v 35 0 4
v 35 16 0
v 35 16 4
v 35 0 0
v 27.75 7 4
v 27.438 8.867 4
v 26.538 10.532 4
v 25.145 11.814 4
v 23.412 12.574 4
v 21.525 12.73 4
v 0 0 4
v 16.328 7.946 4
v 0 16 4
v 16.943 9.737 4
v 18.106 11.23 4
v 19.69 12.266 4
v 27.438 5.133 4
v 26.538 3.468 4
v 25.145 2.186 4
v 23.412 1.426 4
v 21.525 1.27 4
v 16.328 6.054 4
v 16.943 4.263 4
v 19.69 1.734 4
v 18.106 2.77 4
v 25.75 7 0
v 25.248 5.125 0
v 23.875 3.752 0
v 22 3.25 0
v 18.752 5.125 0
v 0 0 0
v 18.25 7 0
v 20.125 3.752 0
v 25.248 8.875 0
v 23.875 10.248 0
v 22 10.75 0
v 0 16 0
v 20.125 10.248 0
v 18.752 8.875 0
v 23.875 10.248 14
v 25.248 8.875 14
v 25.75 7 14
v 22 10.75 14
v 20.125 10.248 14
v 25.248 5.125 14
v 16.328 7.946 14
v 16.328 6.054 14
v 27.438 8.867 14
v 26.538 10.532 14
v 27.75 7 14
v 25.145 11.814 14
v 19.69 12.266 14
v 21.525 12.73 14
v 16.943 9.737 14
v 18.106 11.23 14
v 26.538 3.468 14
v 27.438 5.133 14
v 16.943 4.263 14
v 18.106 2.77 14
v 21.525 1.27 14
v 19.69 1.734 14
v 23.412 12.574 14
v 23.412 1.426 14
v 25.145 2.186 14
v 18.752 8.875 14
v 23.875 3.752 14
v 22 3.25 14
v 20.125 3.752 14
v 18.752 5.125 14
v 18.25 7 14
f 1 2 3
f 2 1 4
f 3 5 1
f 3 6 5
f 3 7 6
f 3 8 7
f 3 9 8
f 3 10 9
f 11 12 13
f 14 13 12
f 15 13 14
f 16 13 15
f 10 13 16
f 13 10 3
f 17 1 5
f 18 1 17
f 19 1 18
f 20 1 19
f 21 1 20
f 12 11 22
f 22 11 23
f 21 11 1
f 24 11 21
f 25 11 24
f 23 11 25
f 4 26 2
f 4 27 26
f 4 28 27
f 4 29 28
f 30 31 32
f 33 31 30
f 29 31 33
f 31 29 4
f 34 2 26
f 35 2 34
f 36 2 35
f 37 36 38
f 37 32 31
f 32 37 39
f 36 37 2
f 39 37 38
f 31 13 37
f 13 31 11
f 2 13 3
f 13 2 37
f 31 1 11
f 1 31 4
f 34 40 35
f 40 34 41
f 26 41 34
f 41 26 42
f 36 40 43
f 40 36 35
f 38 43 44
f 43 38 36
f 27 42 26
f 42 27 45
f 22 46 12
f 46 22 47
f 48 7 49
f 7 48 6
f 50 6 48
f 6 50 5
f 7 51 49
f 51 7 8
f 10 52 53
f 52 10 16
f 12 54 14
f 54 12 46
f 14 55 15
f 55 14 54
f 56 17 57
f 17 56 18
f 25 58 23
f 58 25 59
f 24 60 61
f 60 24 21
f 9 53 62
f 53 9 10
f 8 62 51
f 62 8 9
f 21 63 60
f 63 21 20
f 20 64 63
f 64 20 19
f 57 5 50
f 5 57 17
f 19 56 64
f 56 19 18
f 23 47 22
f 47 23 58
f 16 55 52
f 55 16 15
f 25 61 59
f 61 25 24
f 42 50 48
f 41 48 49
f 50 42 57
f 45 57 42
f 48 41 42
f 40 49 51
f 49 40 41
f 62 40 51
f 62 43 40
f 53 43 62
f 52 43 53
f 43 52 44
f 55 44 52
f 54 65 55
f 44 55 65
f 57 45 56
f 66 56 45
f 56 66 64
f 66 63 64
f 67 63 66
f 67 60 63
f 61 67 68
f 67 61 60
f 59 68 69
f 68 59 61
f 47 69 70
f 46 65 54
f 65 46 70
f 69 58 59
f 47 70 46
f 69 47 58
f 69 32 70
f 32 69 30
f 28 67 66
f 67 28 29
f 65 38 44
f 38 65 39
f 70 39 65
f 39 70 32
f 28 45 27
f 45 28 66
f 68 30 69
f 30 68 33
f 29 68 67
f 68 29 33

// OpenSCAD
difference() {
  cube([35,16,4]);
  translate([22,7,-1]) cylinder(6,3.75,3.75);
}

translate([22,7,0])
difference() {
    cylinder(14,5.75,5.75);
    translate([0,0,-1]) cylinder(16,3.75,3.75);
};
